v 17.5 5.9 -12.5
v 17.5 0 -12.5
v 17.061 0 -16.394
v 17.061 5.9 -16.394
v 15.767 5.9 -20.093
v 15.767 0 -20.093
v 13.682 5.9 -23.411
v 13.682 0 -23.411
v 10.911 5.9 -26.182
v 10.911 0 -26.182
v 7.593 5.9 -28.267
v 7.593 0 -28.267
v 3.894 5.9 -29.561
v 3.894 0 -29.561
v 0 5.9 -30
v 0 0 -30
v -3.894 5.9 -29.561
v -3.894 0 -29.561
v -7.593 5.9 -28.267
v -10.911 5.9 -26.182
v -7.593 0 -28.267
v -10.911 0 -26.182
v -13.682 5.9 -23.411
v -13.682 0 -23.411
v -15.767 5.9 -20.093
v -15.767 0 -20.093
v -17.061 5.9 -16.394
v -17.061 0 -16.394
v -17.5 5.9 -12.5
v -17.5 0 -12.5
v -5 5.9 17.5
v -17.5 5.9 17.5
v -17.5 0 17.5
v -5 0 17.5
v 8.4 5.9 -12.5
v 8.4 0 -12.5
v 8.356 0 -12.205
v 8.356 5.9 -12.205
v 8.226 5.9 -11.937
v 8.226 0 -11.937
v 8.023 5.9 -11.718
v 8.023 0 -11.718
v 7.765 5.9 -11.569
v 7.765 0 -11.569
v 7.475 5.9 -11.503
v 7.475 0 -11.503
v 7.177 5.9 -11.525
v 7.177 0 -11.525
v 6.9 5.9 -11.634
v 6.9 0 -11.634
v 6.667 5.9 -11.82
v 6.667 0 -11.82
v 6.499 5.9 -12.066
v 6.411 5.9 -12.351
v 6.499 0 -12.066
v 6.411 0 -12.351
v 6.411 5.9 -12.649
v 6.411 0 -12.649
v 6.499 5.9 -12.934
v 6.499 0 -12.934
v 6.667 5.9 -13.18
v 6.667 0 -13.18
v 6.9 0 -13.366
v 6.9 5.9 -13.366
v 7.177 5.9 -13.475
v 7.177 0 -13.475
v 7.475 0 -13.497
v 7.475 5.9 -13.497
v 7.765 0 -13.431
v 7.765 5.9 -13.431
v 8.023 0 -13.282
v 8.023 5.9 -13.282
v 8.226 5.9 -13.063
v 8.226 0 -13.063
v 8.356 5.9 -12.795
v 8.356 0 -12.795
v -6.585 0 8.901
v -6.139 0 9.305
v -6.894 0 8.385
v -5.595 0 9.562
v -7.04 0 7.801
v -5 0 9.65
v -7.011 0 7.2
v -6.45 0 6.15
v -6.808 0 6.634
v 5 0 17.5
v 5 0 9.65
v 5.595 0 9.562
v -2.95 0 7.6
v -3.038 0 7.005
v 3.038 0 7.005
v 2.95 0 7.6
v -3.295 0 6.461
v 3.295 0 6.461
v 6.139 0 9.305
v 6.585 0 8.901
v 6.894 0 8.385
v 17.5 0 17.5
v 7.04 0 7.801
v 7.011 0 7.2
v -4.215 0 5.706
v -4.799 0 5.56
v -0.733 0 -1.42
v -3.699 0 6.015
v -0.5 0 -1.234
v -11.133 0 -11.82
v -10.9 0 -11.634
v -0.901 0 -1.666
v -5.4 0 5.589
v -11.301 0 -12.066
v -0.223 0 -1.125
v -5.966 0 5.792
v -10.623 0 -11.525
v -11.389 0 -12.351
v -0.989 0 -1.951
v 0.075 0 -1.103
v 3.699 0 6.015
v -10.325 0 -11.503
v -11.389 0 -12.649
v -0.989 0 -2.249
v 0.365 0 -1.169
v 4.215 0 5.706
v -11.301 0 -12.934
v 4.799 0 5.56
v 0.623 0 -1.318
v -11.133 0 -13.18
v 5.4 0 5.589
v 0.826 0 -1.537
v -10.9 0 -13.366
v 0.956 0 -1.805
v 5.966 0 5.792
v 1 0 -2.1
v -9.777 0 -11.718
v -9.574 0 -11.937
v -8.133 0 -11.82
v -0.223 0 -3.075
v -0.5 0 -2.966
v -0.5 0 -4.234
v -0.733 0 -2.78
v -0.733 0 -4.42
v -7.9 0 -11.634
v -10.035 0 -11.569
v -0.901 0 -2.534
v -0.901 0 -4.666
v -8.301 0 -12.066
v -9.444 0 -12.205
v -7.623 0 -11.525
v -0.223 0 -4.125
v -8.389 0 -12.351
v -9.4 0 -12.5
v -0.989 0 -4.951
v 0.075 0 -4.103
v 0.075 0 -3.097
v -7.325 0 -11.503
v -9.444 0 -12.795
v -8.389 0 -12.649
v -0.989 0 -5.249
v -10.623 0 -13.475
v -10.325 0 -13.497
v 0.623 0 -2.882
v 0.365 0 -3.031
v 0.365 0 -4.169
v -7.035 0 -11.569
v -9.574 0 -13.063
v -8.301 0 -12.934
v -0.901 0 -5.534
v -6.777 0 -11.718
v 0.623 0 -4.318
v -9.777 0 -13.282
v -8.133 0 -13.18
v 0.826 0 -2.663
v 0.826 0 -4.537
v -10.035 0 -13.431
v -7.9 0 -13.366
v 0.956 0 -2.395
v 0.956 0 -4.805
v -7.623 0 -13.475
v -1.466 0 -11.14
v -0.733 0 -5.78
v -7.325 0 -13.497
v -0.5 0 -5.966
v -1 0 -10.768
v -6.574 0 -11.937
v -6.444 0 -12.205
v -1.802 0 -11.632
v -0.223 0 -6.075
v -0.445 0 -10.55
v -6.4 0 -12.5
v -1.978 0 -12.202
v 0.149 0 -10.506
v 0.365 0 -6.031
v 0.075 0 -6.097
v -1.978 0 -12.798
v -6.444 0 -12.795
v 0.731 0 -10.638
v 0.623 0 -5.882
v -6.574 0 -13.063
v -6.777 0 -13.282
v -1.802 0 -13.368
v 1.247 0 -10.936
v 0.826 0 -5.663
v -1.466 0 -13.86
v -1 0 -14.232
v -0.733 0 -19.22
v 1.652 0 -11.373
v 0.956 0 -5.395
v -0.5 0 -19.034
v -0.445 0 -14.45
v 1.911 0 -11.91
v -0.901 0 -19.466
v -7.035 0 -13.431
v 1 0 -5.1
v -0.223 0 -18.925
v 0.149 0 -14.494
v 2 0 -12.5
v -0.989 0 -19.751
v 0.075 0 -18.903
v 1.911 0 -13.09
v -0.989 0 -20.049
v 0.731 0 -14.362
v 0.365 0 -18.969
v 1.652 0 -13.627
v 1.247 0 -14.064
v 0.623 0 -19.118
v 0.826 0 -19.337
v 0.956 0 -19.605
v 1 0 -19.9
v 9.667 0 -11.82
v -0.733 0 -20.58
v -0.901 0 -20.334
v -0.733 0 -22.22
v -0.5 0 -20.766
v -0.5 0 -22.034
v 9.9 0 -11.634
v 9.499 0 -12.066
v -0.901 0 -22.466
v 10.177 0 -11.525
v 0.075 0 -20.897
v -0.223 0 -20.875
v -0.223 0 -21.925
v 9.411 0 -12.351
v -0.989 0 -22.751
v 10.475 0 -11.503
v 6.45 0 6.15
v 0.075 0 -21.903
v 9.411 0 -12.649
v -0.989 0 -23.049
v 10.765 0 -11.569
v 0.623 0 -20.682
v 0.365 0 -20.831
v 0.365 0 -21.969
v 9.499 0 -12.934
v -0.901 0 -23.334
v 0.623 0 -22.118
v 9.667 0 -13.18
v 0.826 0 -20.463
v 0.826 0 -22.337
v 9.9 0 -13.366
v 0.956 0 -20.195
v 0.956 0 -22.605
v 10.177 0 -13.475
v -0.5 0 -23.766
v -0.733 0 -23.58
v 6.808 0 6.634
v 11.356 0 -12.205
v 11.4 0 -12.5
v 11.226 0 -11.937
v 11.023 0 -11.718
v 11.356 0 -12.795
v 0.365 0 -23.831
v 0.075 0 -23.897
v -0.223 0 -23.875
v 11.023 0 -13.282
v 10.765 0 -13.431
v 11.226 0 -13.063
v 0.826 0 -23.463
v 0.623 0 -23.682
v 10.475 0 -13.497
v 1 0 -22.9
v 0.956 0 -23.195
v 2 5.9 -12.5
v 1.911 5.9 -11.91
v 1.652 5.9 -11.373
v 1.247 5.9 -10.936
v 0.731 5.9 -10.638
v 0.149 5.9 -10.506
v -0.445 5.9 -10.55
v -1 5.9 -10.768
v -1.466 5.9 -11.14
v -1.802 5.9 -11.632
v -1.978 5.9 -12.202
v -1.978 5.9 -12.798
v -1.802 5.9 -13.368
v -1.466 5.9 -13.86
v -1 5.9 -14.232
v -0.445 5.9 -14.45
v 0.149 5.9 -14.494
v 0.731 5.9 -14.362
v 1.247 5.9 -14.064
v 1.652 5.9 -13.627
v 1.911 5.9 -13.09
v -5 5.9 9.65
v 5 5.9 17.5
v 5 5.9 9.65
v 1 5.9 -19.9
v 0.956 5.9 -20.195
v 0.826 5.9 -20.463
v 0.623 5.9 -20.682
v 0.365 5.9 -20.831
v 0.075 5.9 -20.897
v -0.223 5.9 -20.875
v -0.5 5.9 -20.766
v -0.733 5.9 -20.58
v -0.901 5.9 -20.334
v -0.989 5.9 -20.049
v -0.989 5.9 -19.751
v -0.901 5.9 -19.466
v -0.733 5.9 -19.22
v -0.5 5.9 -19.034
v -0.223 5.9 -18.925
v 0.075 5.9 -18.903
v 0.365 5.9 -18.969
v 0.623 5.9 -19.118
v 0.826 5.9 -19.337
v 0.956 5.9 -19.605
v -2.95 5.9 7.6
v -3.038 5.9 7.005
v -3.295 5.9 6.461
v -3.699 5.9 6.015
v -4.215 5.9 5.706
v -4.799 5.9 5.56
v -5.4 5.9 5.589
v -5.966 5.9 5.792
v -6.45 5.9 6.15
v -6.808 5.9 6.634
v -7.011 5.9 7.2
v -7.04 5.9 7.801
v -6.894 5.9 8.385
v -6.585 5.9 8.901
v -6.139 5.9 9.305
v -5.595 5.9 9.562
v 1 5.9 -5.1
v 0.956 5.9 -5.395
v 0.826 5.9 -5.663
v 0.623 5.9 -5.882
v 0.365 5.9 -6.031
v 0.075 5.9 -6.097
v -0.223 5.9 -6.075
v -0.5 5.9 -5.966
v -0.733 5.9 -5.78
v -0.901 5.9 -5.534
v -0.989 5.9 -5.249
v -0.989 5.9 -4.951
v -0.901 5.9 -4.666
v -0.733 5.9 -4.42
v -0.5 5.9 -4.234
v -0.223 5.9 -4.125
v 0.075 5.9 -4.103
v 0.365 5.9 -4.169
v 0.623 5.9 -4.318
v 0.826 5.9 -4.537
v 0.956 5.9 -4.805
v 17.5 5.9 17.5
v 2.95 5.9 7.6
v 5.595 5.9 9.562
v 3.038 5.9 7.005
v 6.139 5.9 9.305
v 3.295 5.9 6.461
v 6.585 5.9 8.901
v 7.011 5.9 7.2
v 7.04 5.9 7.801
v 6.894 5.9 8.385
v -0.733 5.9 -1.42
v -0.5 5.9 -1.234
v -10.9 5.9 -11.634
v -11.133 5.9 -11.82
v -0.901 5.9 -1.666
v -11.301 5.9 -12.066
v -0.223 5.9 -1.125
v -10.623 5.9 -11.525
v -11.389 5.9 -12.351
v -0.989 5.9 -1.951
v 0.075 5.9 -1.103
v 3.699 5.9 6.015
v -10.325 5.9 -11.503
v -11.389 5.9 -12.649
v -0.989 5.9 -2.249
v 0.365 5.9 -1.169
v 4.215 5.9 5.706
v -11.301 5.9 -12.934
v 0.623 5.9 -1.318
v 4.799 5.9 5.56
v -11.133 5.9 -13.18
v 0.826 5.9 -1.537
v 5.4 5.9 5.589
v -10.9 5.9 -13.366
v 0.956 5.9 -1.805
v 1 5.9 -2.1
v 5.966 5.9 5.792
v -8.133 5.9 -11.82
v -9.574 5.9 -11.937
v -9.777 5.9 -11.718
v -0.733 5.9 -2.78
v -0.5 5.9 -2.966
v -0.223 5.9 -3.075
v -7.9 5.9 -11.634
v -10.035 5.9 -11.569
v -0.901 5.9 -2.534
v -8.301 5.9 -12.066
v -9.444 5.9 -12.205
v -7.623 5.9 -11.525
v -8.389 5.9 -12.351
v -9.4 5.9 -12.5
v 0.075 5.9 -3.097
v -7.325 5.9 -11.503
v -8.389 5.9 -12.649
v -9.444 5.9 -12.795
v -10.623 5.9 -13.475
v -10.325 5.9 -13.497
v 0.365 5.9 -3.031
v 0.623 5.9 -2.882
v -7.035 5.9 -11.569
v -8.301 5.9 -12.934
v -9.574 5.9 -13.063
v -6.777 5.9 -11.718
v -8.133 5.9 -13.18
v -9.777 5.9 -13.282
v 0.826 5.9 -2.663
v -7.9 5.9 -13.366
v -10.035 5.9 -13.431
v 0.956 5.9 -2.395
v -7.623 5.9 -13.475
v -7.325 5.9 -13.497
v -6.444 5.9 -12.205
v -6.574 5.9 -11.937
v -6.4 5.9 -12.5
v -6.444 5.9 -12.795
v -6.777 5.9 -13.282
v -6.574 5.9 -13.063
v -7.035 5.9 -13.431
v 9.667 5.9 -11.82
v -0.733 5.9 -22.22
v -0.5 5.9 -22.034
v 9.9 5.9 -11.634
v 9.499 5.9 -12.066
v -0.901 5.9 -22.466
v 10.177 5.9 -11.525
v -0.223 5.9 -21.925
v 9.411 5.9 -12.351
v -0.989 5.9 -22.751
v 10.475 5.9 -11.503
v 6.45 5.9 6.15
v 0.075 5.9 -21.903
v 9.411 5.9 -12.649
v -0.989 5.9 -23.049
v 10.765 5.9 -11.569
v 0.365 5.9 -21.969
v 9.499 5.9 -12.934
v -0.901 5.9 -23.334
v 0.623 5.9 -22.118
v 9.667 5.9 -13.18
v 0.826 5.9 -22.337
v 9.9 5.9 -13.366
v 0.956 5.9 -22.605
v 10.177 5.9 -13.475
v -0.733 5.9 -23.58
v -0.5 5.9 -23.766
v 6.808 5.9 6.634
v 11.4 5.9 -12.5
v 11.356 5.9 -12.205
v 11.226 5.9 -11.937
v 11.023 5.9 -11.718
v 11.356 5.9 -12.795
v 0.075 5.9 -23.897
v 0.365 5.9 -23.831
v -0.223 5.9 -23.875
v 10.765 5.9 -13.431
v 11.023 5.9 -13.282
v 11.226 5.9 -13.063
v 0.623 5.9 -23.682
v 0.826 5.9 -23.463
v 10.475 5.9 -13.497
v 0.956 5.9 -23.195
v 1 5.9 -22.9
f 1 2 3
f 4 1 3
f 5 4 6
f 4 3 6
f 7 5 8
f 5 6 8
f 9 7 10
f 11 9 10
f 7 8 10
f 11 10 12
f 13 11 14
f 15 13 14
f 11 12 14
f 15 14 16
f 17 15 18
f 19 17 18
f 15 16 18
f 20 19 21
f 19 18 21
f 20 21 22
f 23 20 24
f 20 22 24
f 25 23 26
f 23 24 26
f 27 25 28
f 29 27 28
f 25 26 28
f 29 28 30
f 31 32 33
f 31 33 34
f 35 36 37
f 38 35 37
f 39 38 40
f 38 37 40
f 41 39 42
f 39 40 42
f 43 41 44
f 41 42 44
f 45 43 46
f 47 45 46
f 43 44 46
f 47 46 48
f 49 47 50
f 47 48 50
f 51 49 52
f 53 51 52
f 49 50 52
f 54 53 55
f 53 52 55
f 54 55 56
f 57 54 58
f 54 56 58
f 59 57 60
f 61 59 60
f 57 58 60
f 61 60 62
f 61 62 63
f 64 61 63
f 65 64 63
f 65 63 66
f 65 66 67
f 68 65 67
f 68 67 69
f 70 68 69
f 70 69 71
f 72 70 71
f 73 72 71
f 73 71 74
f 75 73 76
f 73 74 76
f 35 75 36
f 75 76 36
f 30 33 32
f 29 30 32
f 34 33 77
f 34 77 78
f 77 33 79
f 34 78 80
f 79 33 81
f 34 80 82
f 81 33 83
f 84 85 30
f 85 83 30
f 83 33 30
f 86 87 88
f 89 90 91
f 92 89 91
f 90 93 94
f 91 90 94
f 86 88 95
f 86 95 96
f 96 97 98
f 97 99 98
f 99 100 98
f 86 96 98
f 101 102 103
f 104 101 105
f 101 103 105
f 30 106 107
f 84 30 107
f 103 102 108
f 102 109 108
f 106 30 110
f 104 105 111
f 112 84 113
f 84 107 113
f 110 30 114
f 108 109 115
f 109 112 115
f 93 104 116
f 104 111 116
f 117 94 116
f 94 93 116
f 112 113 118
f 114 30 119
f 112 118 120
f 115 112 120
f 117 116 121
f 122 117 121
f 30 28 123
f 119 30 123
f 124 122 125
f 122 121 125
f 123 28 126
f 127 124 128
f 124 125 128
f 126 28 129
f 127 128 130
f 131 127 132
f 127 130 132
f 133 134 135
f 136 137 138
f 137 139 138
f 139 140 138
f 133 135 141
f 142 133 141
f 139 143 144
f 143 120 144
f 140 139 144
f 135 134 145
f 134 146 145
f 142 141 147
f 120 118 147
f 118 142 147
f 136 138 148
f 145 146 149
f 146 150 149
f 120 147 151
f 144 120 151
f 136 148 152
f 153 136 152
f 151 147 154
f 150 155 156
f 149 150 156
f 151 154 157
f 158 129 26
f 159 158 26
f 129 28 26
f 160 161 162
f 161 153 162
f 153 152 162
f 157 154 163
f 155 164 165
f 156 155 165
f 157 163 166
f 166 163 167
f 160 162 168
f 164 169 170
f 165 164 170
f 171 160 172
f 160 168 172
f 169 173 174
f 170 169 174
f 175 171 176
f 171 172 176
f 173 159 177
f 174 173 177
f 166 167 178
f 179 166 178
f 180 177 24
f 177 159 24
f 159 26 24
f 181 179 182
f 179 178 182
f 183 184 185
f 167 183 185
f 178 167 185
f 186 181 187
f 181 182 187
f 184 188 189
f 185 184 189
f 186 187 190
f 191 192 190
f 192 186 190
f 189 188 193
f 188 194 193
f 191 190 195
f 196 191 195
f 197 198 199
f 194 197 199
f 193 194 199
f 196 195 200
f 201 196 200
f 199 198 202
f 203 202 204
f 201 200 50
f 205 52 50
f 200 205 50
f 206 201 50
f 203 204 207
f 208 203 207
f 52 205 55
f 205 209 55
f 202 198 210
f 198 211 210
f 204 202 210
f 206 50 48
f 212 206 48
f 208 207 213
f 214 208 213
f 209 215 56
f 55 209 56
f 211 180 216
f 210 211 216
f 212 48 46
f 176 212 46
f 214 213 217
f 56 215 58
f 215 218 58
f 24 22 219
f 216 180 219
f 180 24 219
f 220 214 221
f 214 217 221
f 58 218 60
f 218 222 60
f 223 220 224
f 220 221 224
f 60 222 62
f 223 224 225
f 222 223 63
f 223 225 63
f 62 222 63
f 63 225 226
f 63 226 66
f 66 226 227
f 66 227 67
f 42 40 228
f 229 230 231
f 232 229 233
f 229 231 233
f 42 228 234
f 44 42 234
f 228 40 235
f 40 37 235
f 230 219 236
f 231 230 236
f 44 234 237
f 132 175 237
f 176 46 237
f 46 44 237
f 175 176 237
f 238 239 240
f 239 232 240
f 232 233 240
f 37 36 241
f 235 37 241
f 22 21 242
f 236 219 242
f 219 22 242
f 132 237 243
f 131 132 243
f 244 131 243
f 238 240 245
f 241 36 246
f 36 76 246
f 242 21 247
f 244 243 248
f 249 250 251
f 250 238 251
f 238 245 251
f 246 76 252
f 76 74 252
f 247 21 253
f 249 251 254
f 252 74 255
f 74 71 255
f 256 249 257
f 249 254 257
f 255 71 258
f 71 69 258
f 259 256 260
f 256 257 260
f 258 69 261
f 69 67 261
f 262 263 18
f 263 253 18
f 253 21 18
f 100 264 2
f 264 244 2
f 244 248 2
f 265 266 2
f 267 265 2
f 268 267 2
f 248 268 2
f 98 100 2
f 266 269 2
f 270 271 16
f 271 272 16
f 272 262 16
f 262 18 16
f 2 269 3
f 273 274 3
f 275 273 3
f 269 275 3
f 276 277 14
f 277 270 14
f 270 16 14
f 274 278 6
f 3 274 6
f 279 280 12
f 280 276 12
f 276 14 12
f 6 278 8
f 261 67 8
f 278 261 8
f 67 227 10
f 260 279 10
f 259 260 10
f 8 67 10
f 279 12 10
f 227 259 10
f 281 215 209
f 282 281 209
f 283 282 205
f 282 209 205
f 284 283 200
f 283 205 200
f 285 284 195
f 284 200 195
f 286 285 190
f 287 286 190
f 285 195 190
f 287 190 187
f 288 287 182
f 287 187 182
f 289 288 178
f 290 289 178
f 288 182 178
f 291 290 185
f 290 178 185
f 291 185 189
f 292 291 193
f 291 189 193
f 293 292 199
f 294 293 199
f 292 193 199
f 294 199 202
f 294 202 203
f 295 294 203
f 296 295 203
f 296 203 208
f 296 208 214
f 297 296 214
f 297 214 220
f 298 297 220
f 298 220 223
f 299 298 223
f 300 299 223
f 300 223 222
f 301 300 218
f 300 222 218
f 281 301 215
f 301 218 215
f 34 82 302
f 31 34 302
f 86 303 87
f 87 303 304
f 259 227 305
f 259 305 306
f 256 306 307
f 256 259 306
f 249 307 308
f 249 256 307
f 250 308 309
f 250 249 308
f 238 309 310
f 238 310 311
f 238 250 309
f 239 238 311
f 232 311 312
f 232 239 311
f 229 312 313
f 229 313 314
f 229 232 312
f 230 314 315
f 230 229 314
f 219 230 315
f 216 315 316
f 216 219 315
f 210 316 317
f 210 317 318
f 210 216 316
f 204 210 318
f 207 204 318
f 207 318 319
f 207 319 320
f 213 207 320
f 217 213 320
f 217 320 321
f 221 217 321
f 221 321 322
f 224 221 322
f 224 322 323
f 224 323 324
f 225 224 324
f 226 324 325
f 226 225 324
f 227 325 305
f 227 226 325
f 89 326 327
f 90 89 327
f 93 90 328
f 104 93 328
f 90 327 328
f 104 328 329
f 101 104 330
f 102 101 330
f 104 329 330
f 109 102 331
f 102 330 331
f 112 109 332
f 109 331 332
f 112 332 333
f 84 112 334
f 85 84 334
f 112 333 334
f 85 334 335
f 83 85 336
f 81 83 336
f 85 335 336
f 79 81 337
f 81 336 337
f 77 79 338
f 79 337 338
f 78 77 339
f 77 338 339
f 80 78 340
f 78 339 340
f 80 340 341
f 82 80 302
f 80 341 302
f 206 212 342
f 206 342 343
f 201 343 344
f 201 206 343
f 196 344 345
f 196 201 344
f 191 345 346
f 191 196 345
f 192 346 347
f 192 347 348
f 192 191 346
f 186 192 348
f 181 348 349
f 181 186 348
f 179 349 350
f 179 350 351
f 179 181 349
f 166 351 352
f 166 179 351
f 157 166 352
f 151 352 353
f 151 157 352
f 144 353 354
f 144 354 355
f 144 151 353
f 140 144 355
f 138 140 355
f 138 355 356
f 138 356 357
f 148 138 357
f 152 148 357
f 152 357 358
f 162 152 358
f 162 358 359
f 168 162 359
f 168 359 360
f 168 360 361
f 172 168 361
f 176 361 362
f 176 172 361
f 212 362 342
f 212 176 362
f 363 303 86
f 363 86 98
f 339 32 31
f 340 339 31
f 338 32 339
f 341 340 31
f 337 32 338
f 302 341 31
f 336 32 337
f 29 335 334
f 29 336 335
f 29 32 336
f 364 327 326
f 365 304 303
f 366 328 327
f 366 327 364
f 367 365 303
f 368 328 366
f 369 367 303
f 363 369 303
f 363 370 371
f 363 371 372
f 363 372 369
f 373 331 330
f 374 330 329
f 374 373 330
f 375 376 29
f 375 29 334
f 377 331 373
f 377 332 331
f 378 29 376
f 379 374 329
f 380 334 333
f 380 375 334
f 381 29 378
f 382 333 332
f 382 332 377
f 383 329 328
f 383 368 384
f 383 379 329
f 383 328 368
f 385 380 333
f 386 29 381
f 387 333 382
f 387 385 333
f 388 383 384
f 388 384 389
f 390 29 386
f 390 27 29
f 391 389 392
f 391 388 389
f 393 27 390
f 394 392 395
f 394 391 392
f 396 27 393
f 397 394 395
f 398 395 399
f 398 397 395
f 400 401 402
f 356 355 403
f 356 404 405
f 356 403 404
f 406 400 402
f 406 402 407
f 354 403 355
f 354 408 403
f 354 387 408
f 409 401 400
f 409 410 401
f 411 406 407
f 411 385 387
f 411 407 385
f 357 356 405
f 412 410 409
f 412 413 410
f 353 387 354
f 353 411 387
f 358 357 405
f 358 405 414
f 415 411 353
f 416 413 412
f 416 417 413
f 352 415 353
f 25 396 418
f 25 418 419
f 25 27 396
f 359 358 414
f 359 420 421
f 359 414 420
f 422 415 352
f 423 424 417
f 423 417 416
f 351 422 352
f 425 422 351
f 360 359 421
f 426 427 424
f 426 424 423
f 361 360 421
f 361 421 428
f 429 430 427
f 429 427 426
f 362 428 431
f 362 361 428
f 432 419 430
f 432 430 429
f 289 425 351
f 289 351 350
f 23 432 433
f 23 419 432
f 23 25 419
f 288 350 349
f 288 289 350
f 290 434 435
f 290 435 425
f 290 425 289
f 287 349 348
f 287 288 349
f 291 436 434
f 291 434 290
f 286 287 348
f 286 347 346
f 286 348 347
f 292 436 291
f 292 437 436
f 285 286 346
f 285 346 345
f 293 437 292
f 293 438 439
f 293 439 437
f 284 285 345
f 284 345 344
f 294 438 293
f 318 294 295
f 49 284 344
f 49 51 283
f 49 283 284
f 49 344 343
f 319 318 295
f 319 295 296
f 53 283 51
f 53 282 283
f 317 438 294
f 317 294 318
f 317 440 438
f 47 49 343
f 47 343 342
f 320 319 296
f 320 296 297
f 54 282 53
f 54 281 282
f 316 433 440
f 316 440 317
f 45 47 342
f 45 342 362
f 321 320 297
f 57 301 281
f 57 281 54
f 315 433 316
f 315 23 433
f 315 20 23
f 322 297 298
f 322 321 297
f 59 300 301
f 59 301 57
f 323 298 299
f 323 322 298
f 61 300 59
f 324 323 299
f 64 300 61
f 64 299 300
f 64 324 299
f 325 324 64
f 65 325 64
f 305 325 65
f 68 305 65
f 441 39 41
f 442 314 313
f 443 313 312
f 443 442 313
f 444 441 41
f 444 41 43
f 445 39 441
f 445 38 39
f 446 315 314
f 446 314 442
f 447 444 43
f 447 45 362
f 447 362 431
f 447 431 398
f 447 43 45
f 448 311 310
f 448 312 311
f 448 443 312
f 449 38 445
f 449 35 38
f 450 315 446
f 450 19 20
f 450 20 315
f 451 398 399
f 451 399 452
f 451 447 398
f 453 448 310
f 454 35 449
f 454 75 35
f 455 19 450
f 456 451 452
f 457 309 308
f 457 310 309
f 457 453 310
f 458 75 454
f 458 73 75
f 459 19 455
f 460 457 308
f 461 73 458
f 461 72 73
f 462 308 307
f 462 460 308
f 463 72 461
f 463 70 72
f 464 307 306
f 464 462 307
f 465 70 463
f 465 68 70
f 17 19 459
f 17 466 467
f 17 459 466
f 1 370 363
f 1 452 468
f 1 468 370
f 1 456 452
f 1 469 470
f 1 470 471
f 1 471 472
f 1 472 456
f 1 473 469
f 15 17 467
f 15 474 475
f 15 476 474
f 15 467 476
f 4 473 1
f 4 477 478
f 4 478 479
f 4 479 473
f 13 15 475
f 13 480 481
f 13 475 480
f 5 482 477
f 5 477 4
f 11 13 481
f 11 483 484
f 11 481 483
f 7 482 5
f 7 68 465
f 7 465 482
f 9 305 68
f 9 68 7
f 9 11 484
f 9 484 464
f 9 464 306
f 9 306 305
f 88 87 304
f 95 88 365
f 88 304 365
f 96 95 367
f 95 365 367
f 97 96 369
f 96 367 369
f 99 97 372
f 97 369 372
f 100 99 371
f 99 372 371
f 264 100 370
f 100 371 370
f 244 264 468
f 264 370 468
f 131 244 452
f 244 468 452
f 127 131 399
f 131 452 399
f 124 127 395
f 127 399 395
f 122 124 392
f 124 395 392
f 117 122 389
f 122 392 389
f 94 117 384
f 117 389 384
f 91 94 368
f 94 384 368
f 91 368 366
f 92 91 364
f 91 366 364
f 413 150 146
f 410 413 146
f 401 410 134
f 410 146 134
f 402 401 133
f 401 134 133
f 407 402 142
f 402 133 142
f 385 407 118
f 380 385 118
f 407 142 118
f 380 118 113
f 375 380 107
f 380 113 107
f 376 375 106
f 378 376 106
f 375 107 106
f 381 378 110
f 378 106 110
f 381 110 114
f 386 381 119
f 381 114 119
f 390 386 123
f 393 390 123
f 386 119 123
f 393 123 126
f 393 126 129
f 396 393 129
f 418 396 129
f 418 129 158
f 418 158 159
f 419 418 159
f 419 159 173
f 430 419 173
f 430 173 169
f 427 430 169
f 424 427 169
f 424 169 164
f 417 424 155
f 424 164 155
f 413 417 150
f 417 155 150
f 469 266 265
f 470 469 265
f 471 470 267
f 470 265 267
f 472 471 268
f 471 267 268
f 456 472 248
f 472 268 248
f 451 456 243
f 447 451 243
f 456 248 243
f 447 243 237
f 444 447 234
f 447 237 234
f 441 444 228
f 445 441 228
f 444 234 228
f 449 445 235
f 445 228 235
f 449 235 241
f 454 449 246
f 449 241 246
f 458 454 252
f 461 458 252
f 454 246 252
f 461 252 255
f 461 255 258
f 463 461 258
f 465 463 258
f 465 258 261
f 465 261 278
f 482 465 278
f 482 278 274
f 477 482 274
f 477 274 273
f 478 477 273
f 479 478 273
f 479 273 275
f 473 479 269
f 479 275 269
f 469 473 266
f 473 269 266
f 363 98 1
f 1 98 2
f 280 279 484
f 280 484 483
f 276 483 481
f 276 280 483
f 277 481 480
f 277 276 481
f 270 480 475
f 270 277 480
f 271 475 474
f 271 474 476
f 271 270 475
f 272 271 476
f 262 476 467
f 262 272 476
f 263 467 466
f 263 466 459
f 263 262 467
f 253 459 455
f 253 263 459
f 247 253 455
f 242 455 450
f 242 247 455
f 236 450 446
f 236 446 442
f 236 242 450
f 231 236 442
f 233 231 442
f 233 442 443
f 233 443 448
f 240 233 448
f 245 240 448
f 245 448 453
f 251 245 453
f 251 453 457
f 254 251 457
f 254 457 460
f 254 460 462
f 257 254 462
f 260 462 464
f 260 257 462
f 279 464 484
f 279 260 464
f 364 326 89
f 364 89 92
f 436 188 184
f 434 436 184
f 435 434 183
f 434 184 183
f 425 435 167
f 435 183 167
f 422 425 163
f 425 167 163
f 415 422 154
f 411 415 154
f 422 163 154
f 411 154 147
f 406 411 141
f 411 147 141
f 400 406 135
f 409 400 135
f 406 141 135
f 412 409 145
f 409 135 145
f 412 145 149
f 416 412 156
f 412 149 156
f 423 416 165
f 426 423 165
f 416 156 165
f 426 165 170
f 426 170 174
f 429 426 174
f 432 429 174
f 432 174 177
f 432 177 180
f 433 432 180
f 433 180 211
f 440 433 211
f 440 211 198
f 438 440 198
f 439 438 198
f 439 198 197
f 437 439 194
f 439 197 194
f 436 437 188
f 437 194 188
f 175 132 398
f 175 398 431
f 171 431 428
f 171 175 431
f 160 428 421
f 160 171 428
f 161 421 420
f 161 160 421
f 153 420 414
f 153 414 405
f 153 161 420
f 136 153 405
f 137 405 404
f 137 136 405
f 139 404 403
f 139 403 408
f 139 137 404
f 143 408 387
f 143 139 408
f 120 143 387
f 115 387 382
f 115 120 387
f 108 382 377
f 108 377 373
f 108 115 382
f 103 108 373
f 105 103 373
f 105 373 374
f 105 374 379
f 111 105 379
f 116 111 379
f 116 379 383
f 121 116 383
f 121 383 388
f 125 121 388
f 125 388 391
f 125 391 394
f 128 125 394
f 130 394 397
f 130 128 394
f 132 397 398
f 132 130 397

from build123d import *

# Parameters (mm, degrees)
SKETCH1_R           = 1
BOSS_EXTRUDE1_DEPTH = 5.9
SKETCH2_W           = 10
SKETCH2_H           = 11.8
CUT_EXTRUDE1_DEPTH  = 10
SKETCH3_W           = 12.5
SKETCH3_H           = 5.9
BOSS_EXTRUDE2_DEPTH = 5
CUT_EXTRUDE2_REACH  = 7.9
SKETCH4_R           = 2.05


with BuildPart() as part:
    # Sketch1 → Boss-Extrude1 (new body)
    with BuildSketch(Plane(origin=(0, 0, 0), x_dir=(1, 0, 0), z_dir=(0, 1, 0))):
        with BuildLine():
            ThreePointArc((9.4, 12.5), (10.4, 13.5), (11.4, 12.5))
            Line((11.4, 12.5), (17.5, 12.5))
            ThreePointArc((17.5, 12.5), (0, 30), (-17.5, 12.5))
            Line((-17.5, 12.5), (-11.4, 12.5))
            ThreePointArc((-11.4, 12.5), (-10.4, 13.5), (-9.4, 12.5))
            Line((-9.4, 12.5), (-8.4, 12.5))
            ThreePointArc((-8.4, 12.5), (-7.4, 13.5), (-6.4, 12.5))
            Line((-6.4, 12.5), (-2, 12.5))
            ThreePointArc((-2, 12.5), (0, 14.5), (2, 12.5))
            Line((2, 12.5), (6.4, 12.5))
            ThreePointArc((6.4, 12.5), (7.4, 13.5), (8.4, 12.5))
            Line((8.4, 12.5), (9.4, 12.5))
        make_face()
        with Locations((0, 19.9)):
            Circle(SKETCH1_R, mode=Mode.SUBTRACT)
        with Locations((0, 22.9)):
            Circle(SKETCH1_R, mode=Mode.SUBTRACT)
        with BuildLine():
            Line((17.5, 12.5), (11.4, 12.5))
            ThreePointArc((11.4, 12.5), (10.4, 11.5), (9.4, 12.5))
            Line((9.4, 12.5), (8.4, 12.5))
            ThreePointArc((8.4, 12.5), (7.4, 11.5), (6.4, 12.5))
            Line((6.4, 12.5), (2, 12.5))
            ThreePointArc((2, 12.5), (0, 10.5), (-2, 12.5))
            Line((-2, 12.5), (-6.4, 12.5))
            ThreePointArc((-6.4, 12.5), (-7.4, 11.5), (-8.4, 12.5))
            Line((-8.4, 12.5), (-9.4, 12.5))
            ThreePointArc((-9.4, 12.5), (-10.4, 11.5), (-11.4, 12.5))
            Line((-11.4, 12.5), (-17.5, 12.5))
            ThreePointArc((-17.5, 12.5), (0, -5), (17.5, 12.5))
        make_face()
        with Locations((0, 2.1)):
            Circle(SKETCH1_R, mode=Mode.SUBTRACT)
        with Locations((0, 5.1)):
            Circle(SKETCH1_R, mode=Mode.SUBTRACT)
        with BuildLine():
            Line((17.5, -12.5), (17.5, 12.5))
            ThreePointArc((17.5, 12.5), (0, -5), (-17.5, 12.5))
            Line((-17.5, 12.5), (-17.5, -12.5))
            Line((-17.5, -12.5), (17.5, -12.5))
        make_face()
    extrude(amount=BOSS_EXTRUDE1_DEPTH)

    # Sketch2 → Cut-Extrude1 (cut)
    with BuildSketch(Plane(origin=(0, 5.9, 0), x_dir=(1, 0, 0), z_dir=(0, 1, 0))):
        with Locations((0, -13.5)):
            Rectangle(SKETCH2_W, SKETCH2_H)
    extrude(amount=-CUT_EXTRUDE1_DEPTH, mode=Mode.SUBTRACT)

    # Sketch3 → Boss-Extrude2 (add)
    with BuildSketch(Plane.XY.offset(12.5)):
        with Locations((-11.25, 2.95)):
            Rectangle(SKETCH3_W, SKETCH3_H)
        with Locations((11.25, 2.95)):
            Rectangle(SKETCH3_W, SKETCH3_H)
    extrude(amount=BOSS_EXTRUDE2_DEPTH)

    # Sketch4 → Cut-Extrude2 (cut, up to next)
    with BuildSketch(Plane(origin=(0, 5.9, 0), x_dir=(1, 0, 0), z_dir=(0, 1, 0)), mode=Mode.PRIVATE) as cut_extrude2_sk1:
        with Locations((-5, -7.6)):
            Circle(SKETCH4_R)
    cut_extrude2_tool1 = extrude(cut_extrude2_sk1.sketch, amount=-CUT_EXTRUDE2_REACH, mode=Mode.PRIVATE) & part.part
    add(cut_extrude2_tool1.solids().sort_by_distance((-5, 5.9, 7.6))[0], mode=Mode.SUBTRACT)
    # Sketch4 → Cut-Extrude2 (cut, up to next)
    with BuildSketch(Plane(origin=(0, 5.9, 0), x_dir=(1, 0, 0), z_dir=(0, 1, 0)), mode=Mode.PRIVATE) as cut_extrude2_sk2:
        with Locations((5, -7.6)):
            Circle(SKETCH4_R)
    cut_extrude2_tool2 = extrude(cut_extrude2_sk2.sketch, amount=-CUT_EXTRUDE2_REACH, mode=Mode.PRIVATE) & part.part
    add(cut_extrude2_tool2.solids().sort_by_distance((5, 5.9, 7.6))[0], mode=Mode.SUBTRACT)


solid = part.part
